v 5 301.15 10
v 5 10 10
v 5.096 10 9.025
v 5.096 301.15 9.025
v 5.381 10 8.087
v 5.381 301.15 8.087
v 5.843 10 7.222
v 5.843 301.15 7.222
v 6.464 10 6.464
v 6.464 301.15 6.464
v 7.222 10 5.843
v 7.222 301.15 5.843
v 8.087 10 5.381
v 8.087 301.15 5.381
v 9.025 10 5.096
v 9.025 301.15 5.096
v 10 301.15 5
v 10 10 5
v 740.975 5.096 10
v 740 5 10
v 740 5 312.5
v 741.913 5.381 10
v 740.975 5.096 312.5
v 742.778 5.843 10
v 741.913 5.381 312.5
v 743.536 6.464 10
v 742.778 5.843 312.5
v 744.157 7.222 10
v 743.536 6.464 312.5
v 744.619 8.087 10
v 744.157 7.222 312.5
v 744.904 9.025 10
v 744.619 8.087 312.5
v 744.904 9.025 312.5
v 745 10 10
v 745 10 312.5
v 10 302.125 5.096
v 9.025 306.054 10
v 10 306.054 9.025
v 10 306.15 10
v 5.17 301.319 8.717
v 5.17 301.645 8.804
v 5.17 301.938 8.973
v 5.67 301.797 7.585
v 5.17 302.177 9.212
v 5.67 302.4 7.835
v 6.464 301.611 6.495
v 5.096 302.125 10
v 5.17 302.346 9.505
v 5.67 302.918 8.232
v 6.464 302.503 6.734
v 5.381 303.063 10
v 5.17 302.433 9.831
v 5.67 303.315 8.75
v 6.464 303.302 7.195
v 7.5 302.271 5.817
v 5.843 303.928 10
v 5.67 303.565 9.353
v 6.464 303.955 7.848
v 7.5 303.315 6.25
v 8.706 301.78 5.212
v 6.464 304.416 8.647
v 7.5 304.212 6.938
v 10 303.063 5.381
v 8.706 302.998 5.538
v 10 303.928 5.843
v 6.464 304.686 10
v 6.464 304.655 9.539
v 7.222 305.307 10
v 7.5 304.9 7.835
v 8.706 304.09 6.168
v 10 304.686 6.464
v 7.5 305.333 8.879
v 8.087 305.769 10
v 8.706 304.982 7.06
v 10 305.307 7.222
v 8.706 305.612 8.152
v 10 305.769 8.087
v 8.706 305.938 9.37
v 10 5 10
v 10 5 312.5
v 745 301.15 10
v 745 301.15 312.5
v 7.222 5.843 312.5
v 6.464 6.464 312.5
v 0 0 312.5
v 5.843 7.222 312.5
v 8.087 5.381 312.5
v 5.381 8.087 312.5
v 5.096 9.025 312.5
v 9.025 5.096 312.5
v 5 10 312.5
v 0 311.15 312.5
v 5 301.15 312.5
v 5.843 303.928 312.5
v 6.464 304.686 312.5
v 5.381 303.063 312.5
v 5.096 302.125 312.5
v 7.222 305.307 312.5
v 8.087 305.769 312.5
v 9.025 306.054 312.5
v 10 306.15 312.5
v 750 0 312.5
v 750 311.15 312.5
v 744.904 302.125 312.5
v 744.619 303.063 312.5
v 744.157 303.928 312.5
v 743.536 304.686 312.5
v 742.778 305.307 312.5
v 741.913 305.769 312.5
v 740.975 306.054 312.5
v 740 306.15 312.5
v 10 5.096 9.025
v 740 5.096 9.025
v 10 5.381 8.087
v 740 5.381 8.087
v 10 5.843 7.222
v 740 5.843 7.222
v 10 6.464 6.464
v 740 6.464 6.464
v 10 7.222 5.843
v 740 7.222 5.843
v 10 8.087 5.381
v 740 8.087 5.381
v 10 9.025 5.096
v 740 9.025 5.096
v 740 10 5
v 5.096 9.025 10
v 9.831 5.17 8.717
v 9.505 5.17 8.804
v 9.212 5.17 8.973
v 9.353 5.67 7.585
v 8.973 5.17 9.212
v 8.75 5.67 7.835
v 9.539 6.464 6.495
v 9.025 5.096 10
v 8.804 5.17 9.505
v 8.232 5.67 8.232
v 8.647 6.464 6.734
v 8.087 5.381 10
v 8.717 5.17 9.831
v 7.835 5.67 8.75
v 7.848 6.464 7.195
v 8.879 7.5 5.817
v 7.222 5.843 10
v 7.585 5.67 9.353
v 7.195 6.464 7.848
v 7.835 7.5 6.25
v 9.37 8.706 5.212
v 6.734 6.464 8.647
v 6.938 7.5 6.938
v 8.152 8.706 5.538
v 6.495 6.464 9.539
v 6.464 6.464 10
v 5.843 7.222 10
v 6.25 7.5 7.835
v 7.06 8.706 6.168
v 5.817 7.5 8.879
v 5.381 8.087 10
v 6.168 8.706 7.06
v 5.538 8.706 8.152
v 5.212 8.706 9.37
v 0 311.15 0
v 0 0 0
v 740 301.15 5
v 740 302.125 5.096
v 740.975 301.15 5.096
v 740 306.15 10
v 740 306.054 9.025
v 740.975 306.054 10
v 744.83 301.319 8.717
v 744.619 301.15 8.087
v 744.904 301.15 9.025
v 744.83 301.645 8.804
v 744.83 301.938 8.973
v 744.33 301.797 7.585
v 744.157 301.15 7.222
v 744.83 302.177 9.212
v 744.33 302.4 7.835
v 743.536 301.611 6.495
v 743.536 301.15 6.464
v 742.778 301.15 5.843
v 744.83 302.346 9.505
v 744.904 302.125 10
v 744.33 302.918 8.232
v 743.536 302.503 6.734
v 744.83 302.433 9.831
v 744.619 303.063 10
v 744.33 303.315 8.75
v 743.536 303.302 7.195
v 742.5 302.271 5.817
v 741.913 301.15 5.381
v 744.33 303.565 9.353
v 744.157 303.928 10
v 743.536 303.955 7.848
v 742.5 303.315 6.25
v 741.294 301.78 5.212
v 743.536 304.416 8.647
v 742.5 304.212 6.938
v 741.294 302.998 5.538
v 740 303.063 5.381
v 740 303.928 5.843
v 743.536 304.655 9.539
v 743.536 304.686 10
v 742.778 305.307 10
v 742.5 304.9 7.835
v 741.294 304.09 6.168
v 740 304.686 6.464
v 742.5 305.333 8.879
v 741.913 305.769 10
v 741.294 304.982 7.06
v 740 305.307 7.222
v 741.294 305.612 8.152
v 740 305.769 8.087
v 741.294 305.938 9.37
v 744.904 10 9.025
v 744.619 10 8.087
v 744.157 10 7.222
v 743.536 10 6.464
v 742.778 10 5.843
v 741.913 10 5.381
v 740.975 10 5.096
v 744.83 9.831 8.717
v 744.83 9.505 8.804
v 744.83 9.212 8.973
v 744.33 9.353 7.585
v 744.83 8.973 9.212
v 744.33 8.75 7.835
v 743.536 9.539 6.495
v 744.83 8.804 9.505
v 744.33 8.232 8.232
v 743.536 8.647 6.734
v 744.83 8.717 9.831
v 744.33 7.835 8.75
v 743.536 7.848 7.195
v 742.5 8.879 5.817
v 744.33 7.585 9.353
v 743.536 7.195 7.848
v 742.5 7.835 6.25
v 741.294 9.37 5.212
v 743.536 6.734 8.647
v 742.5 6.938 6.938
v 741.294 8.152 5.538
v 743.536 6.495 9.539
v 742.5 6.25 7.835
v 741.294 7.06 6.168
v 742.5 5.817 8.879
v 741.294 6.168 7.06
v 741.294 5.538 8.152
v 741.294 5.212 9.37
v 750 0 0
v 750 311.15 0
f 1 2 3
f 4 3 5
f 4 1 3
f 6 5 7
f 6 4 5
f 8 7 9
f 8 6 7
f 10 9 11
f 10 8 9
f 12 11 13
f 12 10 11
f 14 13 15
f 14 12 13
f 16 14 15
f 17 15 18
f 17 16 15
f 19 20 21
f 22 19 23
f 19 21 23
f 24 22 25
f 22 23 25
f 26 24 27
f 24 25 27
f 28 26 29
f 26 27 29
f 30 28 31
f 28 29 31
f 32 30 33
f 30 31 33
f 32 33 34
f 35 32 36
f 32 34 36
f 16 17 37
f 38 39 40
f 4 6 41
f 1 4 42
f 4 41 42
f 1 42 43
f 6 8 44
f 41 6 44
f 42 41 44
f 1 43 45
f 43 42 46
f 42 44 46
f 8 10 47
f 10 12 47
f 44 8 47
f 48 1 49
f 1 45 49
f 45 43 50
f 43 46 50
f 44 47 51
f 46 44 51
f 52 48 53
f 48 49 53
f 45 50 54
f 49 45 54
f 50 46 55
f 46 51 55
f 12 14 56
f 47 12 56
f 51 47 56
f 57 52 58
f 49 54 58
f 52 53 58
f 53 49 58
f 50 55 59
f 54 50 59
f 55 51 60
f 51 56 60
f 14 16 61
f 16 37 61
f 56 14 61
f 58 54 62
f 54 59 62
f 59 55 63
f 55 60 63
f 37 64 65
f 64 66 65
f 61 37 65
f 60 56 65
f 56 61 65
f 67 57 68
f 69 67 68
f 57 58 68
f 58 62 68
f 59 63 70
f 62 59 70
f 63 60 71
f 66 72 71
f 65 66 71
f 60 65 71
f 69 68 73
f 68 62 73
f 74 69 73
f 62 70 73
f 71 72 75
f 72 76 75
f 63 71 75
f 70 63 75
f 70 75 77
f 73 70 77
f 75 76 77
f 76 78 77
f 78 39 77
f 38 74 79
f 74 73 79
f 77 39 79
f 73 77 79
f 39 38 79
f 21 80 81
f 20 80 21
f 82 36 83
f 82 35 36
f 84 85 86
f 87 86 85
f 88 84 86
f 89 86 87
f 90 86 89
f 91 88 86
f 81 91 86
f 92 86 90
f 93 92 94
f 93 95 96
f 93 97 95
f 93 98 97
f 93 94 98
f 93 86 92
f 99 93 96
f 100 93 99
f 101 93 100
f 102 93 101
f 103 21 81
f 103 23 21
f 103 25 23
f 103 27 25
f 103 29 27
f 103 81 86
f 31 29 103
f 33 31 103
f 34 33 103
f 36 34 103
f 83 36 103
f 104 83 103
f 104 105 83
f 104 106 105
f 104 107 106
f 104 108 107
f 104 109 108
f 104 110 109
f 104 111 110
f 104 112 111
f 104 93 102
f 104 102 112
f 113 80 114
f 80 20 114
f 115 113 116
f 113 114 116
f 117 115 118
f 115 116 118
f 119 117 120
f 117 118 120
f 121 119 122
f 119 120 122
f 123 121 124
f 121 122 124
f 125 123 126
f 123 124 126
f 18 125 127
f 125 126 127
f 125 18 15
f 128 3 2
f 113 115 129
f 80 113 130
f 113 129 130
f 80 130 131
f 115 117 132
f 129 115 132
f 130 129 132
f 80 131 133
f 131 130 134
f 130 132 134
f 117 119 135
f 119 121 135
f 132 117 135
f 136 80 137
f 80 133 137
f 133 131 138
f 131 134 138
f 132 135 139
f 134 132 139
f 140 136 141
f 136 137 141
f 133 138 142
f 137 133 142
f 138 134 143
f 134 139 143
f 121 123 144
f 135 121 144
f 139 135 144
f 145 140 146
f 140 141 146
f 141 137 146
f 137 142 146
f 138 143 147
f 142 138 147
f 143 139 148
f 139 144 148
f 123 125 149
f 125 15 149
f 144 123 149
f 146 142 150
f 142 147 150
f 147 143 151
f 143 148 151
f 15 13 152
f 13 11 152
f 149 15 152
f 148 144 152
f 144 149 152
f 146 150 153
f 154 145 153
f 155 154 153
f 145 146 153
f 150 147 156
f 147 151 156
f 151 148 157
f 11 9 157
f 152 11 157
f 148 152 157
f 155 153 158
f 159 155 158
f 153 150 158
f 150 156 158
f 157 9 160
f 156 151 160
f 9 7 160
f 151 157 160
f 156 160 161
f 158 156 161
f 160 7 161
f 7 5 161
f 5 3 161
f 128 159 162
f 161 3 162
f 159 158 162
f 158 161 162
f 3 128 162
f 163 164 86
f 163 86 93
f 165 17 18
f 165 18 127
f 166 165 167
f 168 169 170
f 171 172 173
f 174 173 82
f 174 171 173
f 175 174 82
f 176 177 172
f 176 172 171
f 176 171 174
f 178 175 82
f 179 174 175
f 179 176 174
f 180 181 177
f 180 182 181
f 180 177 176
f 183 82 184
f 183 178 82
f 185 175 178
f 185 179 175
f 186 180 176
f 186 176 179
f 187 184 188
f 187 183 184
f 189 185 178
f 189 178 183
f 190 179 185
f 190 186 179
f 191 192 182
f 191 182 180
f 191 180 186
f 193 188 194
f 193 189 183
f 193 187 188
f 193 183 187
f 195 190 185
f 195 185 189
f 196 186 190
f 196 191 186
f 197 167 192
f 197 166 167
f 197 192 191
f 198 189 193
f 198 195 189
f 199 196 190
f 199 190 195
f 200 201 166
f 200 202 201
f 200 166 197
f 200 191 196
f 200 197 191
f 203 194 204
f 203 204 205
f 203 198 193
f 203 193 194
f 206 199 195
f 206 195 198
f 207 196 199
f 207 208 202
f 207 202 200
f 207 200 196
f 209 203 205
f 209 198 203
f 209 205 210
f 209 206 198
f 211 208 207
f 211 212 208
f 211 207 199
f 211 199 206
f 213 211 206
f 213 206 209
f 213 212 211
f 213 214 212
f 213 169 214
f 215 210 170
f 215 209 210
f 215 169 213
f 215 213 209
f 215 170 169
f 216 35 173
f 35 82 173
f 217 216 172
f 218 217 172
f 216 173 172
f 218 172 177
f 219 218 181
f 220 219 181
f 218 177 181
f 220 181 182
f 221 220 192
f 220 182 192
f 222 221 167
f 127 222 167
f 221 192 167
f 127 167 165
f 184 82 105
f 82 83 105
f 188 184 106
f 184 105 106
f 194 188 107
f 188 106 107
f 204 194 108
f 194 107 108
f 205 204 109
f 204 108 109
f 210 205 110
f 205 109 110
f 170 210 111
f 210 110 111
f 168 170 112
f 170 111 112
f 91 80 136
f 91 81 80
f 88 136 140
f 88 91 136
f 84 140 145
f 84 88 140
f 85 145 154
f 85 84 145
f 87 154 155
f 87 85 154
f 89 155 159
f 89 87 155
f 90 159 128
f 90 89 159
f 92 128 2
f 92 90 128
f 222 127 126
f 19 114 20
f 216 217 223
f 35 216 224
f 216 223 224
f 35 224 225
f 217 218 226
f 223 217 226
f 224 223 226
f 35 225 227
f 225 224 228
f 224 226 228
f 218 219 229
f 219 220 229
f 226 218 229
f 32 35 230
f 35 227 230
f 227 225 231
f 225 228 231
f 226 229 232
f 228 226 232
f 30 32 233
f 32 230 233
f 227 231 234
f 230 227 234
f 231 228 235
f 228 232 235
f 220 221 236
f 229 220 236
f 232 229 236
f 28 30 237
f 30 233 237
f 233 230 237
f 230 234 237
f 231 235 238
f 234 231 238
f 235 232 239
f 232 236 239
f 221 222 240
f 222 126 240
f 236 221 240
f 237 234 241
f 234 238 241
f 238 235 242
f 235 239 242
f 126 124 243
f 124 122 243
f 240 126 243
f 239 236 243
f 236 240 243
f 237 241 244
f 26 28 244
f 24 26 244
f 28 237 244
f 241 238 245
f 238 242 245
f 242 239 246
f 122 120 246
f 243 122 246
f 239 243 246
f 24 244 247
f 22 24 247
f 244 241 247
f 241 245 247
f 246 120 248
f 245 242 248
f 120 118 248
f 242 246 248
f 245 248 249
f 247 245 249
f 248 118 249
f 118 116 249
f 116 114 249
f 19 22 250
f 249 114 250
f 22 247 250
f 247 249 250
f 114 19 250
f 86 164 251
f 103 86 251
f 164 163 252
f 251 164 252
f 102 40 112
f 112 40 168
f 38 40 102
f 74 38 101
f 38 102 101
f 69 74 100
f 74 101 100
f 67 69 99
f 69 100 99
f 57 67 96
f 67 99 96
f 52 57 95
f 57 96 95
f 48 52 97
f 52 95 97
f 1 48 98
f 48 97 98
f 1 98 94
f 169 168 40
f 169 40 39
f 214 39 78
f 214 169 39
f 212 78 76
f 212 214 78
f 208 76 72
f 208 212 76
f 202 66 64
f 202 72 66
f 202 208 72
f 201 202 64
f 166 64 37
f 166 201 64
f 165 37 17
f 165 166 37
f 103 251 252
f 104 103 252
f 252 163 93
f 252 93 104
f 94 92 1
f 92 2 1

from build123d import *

# Parameters (mm, degrees)
F0_W     = 740
F0_H     = 301.15
F1_DEPTH = 5
F0_W_2   = 750
F0_H_2   = 311.15
F2_DEPTH = 312.5
F3_R     = 5


with BuildPart() as f1:
    # F0 (on Top) → F1 (new body)
    with BuildSketch(Plane.XY):
        with Locations((375, 155.575)):
            Rectangle(F0_W, F0_H)
    extrude(amount=F1_DEPTH)

    # F0 (on Top) → F2 (join)
    with BuildSketch(Plane.XY):
        with Locations((375, 155.575)):
            Rectangle(F0_W_2, F0_H_2)
        with Locations((375, 155.575)):
            Rectangle(F0_W, F0_H, mode=Mode.SUBTRACT)
    extrude(amount=F2_DEPTH)

    # F3
    f3_edges = [f1.edges().sort_by_distance(p)[0] for p in [
        (375, 306.15, 5),
        (5, 155.575, 5),
        (375, 5, 5),
        (745, 155.575, 5),
        (5, 306.15, 158.75),
        (5, 5, 158.75),
        (745, 306.15, 158.75),
        (745, 5, 158.75),
    ]]
    fillet(f3_edges, radius=F3_R)


solid = f1.part
